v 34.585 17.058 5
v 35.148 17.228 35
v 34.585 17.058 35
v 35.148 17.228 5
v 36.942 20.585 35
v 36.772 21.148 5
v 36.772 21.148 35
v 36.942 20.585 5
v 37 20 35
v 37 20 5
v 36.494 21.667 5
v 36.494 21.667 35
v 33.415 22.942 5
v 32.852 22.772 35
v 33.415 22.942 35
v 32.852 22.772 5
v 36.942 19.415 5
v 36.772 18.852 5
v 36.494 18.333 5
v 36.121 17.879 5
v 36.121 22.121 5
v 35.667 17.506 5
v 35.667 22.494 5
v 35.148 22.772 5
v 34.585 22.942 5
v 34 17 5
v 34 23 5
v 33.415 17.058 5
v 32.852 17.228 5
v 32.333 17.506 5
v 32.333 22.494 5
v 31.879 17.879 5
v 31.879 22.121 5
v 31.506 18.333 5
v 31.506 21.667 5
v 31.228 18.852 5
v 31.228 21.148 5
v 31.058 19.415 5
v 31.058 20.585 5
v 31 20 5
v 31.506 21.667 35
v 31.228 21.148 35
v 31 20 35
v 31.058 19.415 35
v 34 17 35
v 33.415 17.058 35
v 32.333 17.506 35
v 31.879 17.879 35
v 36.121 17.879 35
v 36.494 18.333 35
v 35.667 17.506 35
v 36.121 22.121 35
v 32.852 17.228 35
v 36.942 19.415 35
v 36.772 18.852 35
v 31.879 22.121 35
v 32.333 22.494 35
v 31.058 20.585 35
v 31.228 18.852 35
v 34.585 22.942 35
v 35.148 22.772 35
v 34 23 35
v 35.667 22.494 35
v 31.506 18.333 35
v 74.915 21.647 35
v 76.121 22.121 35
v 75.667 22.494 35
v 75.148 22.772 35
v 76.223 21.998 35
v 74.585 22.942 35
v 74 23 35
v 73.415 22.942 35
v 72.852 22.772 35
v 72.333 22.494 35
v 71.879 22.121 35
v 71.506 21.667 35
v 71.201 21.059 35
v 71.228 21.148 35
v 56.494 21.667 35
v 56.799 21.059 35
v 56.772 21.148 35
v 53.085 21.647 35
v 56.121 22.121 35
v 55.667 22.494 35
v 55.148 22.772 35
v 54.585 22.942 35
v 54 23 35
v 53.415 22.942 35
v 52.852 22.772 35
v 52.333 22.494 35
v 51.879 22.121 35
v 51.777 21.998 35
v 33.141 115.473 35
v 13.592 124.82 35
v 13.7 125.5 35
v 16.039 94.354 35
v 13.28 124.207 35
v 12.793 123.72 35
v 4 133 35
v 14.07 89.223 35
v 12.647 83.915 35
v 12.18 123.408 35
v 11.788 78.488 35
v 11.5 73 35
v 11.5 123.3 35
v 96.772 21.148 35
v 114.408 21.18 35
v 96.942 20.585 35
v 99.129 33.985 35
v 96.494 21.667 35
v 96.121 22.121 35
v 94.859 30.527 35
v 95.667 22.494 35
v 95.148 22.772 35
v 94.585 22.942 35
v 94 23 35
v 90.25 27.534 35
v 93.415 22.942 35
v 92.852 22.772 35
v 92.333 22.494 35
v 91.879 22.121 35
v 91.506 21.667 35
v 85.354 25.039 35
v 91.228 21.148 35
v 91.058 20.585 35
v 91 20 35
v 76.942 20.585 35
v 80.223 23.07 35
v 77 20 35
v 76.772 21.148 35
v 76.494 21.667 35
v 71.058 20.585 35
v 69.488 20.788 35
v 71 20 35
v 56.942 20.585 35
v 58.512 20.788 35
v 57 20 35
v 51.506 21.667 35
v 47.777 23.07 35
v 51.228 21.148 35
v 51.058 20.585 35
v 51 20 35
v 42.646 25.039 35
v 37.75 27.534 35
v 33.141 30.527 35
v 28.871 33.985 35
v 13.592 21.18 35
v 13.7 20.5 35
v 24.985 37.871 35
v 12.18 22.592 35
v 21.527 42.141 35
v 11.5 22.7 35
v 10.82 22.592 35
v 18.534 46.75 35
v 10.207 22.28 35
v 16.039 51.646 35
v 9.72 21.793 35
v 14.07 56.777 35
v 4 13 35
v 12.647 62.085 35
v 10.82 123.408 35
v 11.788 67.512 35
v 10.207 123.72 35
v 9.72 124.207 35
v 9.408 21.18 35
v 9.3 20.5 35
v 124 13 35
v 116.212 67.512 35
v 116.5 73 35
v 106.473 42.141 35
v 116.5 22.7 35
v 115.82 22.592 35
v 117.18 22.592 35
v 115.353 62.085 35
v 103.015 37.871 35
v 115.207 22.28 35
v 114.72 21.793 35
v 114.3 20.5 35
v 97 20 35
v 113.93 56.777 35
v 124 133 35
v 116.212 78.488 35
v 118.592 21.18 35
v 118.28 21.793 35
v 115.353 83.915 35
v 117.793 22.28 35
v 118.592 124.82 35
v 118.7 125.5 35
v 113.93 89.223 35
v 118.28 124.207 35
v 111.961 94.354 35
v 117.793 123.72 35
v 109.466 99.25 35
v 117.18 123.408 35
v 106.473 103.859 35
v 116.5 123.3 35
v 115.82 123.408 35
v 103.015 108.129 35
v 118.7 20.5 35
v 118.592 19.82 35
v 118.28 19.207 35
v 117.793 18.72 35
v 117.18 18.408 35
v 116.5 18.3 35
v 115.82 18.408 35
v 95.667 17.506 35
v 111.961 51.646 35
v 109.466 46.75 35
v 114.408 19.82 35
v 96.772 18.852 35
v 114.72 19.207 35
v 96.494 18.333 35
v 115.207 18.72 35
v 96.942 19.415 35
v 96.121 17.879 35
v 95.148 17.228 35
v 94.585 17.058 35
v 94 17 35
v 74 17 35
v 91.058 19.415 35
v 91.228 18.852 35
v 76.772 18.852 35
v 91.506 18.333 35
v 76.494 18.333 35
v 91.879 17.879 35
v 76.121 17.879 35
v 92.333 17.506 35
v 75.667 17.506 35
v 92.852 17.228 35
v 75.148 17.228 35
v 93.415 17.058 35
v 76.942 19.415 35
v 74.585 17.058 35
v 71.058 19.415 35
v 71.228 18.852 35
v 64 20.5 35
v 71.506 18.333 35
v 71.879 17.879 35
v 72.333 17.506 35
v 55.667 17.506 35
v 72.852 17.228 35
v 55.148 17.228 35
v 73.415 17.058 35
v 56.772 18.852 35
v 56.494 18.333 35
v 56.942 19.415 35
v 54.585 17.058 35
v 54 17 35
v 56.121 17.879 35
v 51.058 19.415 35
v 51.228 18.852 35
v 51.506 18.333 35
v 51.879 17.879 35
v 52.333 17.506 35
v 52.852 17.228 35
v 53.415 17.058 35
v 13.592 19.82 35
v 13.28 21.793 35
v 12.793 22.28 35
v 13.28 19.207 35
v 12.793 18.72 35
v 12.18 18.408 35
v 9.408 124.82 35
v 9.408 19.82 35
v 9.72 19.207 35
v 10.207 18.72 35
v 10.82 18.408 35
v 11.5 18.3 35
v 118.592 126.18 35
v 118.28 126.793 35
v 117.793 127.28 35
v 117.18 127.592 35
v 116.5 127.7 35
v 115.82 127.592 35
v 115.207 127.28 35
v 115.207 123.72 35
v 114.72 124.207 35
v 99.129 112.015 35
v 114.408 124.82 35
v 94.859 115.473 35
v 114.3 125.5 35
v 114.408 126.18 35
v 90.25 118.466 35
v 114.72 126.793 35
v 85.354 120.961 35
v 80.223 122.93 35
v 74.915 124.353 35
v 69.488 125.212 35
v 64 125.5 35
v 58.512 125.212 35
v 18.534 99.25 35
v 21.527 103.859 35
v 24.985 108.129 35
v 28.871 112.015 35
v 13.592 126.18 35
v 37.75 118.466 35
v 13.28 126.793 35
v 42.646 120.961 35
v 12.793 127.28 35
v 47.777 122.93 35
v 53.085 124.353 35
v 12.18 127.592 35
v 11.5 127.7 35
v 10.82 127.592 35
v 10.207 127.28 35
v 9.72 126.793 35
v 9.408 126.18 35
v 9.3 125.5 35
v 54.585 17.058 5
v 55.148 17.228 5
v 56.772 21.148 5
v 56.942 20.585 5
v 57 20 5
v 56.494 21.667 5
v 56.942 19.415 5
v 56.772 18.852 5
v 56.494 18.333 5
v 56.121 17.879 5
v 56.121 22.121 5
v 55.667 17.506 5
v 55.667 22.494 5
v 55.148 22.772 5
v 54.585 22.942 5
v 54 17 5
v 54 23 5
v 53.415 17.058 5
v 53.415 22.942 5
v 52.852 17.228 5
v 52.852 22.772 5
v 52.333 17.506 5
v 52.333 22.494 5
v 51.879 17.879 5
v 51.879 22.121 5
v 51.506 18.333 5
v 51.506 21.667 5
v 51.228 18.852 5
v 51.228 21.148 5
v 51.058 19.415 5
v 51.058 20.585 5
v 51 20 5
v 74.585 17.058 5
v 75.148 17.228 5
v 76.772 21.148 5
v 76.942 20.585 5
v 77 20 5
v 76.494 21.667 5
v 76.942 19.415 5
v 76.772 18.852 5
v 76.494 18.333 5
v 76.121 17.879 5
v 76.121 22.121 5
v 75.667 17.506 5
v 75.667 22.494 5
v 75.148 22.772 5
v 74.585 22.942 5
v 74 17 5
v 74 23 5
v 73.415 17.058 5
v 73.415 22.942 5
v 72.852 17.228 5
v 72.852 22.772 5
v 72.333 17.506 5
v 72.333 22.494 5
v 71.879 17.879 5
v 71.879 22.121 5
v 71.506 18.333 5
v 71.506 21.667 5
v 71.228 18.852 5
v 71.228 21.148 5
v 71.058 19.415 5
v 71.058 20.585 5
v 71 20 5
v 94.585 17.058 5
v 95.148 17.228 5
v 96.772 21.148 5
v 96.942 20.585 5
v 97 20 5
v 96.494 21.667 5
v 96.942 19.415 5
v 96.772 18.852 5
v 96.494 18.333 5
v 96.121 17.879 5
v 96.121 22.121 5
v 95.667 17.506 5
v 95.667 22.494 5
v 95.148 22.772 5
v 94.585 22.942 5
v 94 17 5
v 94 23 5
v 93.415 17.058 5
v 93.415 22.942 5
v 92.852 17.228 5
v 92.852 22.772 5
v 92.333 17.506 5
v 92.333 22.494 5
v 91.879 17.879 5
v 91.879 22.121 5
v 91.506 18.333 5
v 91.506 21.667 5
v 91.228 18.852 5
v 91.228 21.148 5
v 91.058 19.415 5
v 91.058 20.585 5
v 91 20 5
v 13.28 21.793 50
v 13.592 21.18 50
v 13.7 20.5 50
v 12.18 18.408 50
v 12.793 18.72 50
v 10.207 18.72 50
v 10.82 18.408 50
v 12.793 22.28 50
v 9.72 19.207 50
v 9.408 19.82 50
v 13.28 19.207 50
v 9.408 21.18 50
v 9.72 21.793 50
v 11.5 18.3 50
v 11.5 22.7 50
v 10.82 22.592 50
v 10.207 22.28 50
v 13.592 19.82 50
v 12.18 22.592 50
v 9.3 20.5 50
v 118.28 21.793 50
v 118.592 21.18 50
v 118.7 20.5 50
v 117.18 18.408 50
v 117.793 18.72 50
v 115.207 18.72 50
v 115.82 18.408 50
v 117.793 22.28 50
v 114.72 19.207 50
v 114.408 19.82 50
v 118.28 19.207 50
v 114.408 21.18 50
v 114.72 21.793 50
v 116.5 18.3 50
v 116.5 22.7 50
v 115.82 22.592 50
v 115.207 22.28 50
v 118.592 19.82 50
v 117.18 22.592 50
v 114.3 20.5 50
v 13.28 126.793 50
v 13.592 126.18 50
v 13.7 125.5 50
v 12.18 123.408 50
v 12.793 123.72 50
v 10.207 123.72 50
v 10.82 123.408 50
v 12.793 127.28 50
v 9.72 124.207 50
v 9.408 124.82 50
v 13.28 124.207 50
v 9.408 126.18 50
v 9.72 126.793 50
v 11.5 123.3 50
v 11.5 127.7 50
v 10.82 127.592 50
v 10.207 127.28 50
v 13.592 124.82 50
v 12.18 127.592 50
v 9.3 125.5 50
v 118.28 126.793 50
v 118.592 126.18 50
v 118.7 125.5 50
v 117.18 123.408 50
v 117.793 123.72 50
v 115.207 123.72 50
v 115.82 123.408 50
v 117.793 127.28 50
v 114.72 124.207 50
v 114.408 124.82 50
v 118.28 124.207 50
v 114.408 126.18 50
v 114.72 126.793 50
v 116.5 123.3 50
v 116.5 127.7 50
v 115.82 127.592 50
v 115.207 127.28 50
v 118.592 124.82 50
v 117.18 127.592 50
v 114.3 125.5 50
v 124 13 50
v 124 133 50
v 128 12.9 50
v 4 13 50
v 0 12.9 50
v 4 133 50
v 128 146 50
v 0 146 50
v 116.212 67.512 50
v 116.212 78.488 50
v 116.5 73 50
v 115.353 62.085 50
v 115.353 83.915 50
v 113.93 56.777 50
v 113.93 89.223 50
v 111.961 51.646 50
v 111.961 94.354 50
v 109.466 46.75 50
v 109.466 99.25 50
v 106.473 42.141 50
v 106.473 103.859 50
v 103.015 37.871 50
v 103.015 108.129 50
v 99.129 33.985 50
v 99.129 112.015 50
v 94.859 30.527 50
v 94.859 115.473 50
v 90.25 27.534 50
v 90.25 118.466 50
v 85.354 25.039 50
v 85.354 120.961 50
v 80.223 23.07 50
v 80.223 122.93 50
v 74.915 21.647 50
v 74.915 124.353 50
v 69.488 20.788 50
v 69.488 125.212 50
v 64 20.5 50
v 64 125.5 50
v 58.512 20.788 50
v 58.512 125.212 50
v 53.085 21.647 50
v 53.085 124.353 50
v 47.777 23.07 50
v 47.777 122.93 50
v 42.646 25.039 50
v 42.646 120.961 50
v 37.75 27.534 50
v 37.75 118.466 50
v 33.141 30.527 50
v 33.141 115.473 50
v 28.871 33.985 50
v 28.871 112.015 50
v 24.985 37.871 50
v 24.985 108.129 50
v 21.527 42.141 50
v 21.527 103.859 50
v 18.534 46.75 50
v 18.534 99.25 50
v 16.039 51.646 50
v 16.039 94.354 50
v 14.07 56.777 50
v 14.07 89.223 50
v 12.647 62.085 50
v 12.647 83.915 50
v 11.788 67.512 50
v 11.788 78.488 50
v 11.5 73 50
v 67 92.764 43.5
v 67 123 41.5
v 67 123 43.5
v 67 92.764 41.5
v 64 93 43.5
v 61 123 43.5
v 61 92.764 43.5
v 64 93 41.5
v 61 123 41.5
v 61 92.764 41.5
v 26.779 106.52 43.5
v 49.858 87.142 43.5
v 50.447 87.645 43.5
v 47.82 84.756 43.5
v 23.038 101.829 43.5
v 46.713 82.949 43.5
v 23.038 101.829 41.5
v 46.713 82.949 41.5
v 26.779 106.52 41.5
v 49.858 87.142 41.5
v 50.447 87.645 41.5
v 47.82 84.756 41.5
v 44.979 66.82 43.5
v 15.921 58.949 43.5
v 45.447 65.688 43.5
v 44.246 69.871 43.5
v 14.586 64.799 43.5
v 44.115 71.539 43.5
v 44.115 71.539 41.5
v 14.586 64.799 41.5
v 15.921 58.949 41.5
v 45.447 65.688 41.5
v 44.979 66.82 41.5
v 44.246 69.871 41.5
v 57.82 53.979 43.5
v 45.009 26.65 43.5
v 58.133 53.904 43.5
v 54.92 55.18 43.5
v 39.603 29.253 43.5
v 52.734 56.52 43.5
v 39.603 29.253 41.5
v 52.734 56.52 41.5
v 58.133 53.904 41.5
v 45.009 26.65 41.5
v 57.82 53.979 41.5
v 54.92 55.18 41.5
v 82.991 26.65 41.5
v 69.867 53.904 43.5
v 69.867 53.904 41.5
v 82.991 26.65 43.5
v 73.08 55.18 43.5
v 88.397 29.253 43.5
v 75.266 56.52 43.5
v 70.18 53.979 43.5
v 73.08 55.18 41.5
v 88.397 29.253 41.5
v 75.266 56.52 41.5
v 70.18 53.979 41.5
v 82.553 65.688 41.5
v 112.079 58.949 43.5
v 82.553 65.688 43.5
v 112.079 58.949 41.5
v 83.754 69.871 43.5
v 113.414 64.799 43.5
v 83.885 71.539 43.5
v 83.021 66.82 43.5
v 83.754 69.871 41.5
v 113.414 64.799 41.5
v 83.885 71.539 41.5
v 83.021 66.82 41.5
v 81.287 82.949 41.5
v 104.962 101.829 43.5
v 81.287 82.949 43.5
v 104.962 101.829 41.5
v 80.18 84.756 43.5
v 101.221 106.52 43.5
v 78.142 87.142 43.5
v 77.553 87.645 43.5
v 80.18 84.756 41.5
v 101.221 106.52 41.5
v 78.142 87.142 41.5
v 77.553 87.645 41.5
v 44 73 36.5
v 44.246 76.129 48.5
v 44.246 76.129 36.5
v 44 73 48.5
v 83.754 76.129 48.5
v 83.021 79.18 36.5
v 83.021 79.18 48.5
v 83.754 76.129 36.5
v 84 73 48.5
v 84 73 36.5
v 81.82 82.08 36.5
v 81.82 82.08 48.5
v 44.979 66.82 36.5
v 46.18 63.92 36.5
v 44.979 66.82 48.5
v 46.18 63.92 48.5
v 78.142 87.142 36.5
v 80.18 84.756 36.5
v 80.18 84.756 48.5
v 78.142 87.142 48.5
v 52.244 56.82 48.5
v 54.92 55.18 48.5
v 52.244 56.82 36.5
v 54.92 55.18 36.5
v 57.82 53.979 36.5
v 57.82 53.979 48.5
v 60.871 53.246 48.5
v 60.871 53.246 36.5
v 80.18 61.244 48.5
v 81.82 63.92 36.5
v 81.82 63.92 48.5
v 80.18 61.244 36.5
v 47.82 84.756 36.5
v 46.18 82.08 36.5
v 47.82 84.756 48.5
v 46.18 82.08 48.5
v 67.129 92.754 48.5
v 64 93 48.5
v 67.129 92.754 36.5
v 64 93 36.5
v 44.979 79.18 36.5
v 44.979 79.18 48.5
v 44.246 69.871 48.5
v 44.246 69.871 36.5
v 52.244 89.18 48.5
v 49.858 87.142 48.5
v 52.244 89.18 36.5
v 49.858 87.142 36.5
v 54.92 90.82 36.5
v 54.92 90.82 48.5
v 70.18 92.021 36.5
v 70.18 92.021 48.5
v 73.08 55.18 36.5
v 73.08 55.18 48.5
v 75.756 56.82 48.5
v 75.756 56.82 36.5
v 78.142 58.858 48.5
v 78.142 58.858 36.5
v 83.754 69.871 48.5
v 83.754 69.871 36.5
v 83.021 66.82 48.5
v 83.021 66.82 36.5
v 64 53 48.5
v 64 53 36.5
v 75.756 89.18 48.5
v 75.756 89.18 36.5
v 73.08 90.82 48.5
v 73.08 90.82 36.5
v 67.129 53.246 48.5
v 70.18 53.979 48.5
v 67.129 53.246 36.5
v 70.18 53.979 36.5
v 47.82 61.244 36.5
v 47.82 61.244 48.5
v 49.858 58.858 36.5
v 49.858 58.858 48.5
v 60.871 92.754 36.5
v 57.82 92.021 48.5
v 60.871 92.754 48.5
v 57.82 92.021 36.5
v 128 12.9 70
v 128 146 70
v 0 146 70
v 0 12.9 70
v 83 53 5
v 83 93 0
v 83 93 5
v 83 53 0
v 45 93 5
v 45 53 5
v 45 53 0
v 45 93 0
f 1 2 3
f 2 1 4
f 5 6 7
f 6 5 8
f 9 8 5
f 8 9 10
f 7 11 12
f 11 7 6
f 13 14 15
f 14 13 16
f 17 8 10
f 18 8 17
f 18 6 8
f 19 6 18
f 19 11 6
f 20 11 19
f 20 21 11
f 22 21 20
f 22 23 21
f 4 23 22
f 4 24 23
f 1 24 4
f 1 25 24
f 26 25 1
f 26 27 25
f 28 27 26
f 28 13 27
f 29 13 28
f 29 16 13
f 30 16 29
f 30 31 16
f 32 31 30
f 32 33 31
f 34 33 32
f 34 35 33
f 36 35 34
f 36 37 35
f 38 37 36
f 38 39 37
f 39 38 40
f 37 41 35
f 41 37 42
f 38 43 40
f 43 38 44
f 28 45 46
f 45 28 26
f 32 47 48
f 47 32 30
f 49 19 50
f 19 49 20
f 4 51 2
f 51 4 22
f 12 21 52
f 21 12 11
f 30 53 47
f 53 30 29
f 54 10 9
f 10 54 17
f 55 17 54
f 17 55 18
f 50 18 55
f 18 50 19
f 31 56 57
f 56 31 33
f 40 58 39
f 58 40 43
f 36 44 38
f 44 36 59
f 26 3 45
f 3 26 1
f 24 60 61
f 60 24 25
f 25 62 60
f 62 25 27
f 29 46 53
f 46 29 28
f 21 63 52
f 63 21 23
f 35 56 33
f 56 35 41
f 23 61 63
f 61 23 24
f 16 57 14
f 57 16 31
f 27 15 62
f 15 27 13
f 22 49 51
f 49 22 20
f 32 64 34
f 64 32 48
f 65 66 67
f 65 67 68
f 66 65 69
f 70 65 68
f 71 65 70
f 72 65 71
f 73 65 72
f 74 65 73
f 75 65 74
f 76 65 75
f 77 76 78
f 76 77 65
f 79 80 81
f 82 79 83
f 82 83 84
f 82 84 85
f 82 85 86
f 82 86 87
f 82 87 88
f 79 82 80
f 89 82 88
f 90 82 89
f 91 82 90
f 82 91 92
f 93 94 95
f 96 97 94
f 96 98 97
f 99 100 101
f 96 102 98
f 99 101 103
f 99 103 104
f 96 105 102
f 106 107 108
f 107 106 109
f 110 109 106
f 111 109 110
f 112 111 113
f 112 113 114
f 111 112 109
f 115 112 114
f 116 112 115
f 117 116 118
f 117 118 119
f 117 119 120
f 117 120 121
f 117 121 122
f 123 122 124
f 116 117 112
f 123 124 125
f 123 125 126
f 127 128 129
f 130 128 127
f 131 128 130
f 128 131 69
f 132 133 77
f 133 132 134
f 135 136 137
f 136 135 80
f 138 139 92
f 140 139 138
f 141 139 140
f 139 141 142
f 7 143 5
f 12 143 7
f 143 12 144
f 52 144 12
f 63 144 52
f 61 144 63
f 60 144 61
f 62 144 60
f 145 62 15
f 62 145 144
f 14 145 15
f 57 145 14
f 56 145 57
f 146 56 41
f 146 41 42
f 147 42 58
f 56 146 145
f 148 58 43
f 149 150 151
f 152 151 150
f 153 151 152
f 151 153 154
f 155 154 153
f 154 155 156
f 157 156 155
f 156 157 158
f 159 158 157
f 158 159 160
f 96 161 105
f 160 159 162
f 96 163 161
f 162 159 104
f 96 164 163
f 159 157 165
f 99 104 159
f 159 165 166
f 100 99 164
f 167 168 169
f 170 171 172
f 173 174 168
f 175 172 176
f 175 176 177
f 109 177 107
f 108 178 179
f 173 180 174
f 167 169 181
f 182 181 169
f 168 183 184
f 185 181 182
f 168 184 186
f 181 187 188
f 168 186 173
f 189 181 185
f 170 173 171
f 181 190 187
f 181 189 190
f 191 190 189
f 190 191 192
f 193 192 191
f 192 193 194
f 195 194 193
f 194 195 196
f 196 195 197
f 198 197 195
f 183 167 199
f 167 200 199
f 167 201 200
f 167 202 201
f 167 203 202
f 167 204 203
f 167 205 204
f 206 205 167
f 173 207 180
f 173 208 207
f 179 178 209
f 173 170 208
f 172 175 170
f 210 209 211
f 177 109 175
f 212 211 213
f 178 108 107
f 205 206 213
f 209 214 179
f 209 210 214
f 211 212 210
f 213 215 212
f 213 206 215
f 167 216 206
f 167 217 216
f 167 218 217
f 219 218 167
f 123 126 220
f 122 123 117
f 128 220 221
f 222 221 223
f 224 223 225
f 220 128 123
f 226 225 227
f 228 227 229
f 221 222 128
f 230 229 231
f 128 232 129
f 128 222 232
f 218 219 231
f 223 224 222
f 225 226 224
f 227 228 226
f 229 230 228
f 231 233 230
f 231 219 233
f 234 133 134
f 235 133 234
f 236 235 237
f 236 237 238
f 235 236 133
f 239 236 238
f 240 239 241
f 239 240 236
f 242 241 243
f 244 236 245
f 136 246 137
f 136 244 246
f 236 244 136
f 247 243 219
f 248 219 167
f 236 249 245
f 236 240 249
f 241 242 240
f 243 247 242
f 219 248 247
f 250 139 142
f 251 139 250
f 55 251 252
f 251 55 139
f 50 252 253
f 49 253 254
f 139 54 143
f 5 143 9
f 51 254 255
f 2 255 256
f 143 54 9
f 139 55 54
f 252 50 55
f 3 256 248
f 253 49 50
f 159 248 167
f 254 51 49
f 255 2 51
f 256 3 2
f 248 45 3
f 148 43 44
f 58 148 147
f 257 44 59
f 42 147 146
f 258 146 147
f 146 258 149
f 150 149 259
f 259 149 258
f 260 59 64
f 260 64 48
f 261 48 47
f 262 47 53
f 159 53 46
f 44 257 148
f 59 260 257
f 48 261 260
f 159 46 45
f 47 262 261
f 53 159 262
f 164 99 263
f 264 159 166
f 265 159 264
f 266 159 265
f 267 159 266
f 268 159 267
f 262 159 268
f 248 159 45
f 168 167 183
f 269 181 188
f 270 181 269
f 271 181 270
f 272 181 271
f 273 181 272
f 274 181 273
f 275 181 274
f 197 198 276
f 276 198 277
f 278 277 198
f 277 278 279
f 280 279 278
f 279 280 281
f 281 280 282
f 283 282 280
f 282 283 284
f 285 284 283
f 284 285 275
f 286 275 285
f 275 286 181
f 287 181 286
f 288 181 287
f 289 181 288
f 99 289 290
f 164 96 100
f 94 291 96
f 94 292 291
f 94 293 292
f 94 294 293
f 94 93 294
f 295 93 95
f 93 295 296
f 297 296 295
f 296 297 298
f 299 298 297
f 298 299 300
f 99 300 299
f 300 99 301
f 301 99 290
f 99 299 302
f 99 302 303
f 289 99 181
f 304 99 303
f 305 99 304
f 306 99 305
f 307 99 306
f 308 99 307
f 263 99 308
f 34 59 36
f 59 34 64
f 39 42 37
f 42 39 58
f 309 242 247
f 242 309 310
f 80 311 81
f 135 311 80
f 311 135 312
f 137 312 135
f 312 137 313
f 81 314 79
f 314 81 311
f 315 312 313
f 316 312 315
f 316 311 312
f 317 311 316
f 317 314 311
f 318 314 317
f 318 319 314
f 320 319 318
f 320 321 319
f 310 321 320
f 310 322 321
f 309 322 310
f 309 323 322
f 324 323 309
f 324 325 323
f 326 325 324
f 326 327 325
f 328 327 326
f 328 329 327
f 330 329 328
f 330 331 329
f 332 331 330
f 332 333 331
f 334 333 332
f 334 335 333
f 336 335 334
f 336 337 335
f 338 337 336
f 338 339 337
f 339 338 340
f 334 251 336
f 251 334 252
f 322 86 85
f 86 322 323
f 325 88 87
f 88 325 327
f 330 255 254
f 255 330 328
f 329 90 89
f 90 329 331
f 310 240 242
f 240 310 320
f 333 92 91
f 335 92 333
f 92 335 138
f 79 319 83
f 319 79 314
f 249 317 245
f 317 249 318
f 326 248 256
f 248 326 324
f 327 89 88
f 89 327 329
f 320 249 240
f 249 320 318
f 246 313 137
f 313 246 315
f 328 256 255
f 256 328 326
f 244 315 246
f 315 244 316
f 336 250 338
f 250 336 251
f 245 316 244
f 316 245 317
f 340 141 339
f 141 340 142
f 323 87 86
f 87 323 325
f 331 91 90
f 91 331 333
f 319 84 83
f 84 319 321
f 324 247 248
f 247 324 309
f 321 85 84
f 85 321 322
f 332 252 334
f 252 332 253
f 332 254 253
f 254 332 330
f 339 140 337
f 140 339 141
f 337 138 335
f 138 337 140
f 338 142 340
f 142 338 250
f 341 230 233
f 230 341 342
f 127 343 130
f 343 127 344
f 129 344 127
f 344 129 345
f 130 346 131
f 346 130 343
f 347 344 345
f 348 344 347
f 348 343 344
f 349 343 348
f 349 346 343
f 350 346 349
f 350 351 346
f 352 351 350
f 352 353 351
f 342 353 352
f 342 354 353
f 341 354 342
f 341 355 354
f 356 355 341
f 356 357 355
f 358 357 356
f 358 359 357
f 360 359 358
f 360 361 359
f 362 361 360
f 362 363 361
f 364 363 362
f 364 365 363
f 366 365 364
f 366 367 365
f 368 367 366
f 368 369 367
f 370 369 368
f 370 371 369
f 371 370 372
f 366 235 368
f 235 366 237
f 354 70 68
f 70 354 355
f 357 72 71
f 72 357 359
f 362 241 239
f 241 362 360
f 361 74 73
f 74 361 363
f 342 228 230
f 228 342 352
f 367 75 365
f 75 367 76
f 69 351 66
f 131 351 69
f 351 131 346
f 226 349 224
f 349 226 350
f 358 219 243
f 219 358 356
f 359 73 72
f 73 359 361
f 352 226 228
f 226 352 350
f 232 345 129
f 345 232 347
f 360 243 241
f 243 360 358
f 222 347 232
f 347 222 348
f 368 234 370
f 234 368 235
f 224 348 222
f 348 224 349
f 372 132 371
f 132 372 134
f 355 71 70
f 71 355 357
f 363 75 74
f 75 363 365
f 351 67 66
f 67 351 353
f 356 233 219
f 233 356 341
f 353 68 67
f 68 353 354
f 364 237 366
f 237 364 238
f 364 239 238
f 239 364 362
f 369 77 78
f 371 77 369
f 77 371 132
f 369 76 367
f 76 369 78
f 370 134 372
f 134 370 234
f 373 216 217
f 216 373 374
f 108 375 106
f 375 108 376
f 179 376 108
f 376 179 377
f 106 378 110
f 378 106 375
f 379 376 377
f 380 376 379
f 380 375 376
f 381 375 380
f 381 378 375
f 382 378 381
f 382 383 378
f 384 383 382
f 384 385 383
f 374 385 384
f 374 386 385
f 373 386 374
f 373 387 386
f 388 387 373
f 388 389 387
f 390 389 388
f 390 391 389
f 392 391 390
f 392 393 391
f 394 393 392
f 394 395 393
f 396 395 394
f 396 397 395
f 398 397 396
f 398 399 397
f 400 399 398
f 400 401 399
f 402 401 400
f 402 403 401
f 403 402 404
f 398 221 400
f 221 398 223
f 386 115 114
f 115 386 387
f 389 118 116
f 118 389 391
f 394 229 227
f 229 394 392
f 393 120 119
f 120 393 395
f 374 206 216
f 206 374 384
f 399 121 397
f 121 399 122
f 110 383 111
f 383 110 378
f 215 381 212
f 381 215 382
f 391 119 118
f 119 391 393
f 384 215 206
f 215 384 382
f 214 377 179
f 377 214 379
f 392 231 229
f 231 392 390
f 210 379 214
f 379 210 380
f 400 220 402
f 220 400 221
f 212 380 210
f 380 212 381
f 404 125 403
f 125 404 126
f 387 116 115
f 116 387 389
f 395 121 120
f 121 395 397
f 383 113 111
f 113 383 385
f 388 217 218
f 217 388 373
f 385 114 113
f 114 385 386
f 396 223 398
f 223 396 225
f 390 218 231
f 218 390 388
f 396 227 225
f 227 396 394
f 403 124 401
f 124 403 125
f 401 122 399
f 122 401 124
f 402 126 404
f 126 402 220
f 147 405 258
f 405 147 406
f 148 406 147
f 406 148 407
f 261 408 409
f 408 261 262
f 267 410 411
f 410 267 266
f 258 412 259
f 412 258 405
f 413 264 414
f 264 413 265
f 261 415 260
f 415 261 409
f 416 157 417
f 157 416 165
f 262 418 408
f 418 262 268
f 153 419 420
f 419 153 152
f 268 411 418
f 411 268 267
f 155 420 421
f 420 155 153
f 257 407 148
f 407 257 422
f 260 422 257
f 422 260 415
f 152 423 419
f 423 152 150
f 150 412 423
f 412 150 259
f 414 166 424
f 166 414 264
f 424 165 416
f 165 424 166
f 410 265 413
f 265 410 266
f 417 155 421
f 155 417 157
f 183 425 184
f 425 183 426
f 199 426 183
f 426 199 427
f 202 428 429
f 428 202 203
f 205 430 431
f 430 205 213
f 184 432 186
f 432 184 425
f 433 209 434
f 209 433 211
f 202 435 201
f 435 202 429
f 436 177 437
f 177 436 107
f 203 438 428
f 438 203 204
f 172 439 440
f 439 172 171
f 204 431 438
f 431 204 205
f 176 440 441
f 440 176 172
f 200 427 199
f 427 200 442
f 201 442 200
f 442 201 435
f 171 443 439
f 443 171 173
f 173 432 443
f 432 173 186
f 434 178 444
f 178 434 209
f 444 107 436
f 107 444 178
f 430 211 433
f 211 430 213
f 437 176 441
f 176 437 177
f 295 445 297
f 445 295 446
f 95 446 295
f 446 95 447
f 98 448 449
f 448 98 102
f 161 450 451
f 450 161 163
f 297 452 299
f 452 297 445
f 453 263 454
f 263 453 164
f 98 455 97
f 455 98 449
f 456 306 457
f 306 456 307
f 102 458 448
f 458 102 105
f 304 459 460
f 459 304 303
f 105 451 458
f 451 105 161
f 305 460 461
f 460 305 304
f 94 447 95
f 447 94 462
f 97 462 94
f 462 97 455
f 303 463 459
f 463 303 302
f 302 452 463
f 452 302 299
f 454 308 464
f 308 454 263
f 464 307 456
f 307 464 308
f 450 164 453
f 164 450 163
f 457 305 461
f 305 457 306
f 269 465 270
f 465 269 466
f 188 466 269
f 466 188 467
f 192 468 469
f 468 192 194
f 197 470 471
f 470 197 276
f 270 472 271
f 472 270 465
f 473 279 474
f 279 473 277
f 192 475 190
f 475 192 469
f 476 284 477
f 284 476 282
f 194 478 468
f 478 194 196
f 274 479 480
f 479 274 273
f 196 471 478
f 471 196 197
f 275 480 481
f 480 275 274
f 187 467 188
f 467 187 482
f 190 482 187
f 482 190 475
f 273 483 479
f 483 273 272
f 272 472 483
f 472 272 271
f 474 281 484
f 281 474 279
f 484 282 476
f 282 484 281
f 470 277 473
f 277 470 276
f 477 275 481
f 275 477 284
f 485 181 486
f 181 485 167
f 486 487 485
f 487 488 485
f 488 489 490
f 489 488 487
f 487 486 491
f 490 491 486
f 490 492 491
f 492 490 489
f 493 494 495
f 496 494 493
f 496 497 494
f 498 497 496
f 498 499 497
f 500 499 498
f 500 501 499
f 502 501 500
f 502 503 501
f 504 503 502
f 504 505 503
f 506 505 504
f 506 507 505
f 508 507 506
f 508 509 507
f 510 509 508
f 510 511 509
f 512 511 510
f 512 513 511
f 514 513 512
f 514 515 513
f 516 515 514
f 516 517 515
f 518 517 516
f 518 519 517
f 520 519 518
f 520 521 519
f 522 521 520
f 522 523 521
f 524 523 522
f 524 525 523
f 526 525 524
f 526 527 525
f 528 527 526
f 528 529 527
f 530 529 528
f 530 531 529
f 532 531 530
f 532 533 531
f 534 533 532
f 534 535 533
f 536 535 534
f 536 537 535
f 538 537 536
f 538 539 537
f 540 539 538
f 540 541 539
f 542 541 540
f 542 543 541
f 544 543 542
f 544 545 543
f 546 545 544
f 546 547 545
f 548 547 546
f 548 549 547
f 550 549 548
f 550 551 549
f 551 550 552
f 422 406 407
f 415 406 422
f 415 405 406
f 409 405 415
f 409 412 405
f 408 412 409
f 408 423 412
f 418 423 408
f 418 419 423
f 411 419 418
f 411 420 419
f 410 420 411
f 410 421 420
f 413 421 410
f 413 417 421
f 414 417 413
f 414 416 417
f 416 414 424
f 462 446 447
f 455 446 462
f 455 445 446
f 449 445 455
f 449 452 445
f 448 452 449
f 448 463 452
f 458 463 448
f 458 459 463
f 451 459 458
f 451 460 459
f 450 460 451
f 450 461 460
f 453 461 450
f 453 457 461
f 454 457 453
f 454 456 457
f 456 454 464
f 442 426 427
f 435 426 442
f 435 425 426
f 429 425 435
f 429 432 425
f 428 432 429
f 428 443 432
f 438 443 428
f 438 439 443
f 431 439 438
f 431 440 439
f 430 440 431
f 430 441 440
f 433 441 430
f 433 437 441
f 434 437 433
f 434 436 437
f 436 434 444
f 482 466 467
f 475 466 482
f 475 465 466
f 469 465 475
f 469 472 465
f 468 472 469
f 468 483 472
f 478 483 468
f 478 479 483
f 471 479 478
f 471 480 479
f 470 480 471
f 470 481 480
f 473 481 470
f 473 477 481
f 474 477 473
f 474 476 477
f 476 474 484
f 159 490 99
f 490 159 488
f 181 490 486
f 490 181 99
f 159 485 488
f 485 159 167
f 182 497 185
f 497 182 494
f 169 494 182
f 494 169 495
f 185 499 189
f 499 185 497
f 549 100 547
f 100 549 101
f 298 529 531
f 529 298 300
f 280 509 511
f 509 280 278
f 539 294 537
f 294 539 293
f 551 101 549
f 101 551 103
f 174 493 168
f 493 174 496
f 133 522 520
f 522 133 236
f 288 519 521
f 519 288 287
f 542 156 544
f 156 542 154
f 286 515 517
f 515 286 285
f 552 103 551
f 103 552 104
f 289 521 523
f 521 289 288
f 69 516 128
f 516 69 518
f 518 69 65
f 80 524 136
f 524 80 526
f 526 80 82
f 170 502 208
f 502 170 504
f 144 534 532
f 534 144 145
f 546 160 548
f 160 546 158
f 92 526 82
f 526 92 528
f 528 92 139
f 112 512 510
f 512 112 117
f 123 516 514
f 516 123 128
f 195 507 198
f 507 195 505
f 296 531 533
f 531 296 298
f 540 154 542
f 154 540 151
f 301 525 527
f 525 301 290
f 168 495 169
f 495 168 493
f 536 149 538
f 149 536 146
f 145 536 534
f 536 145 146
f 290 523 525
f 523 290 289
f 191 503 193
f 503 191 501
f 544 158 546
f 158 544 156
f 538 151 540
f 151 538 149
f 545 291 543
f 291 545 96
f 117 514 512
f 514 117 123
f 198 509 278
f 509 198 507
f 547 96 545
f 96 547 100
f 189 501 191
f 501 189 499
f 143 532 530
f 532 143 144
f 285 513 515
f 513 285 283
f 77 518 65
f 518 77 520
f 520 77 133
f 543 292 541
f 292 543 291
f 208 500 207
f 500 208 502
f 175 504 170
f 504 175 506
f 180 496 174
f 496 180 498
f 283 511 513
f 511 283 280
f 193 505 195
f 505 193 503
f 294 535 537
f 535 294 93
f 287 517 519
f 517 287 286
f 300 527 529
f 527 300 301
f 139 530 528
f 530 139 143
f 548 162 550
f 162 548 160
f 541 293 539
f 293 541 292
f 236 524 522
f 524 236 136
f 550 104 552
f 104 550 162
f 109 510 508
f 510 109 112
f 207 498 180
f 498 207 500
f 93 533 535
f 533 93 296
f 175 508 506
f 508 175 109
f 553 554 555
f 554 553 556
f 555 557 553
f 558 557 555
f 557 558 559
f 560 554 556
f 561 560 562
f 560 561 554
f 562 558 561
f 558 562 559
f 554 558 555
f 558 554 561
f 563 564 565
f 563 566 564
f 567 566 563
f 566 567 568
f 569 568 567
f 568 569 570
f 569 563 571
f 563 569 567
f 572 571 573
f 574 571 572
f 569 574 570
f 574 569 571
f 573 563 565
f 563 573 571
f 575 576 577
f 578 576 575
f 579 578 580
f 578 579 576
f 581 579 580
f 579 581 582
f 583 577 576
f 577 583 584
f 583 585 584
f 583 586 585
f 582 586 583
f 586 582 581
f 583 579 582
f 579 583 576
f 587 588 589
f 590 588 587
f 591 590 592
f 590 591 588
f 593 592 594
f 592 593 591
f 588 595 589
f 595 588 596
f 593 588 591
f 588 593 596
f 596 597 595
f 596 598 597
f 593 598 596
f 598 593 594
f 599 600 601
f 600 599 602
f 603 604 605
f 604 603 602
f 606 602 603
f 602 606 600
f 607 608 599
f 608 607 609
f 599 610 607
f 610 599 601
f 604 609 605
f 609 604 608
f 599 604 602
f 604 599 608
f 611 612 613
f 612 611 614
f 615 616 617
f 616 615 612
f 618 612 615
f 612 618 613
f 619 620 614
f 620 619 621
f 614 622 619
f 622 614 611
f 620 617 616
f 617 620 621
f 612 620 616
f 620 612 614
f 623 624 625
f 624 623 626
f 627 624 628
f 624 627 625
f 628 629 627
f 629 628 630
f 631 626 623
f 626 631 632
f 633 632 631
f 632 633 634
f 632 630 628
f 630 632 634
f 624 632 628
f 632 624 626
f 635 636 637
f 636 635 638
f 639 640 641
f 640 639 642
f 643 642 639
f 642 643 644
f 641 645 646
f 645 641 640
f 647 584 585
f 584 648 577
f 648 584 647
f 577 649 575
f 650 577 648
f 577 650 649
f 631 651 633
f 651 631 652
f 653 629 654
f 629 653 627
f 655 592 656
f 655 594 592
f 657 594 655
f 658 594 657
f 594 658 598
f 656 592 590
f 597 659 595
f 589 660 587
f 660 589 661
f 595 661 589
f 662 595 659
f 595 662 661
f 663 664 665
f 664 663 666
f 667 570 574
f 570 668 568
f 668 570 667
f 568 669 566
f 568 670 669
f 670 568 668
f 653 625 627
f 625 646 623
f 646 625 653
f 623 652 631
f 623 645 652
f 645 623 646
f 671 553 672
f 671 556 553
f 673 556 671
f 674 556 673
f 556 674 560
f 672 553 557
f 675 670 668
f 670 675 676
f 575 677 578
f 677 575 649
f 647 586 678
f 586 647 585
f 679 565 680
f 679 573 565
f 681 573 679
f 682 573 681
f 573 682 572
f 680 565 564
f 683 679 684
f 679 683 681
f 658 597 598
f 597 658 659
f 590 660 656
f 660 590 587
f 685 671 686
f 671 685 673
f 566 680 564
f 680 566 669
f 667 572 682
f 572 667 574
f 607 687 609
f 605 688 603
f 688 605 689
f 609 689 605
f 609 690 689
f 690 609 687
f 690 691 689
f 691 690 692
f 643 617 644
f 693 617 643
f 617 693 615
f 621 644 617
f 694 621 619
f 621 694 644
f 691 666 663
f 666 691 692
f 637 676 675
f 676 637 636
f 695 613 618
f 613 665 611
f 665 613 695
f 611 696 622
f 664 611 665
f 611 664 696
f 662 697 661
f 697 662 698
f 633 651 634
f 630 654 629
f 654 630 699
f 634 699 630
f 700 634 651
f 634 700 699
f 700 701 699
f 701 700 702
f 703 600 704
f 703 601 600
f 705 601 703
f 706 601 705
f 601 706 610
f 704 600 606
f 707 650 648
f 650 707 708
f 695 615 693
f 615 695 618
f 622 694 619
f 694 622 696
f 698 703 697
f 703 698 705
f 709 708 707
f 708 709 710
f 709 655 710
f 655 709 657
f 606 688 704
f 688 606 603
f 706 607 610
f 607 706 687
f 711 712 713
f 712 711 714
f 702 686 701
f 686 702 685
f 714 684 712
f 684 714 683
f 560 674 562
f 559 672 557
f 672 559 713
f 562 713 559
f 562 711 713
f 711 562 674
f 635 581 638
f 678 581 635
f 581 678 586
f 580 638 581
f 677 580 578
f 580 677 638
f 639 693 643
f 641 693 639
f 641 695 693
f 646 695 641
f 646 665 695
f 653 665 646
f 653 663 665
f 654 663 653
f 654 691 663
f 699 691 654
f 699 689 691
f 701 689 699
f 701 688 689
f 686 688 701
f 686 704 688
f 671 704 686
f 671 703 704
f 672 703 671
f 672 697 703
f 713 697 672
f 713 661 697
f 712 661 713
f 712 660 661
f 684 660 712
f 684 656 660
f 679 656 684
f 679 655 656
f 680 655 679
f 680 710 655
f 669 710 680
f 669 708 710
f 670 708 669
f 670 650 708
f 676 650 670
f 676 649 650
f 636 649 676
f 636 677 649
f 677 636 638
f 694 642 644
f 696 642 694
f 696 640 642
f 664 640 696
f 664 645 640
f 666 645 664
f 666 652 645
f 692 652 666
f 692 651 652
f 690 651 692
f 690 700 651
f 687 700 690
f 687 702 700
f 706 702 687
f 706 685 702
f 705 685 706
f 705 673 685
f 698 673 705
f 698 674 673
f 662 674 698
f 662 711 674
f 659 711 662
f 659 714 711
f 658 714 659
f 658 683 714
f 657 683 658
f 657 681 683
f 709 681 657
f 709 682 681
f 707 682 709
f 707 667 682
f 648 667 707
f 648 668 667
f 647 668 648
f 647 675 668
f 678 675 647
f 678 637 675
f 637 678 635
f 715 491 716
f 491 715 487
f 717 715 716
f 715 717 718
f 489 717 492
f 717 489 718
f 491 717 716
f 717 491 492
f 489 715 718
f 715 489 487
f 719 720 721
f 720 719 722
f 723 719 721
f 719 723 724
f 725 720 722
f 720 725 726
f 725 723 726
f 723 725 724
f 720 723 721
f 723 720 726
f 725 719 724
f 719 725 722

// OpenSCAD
// file: ../cooling/fan_120mm_15mm.scad
// 120mm Slim Case Fan Model
// 120x120x15mm fan (NF-A12x15 style)

module fan_120mm_15mm() {
    fan_size = 120;
    fan_thickness = 15;
    hub_diameter = 40;
    mount_hole_inset = 7.5;  // Distance from edge to mount hole center
    mount_hole_radius = 2.2; // ~M4 clearance

    union() {
        color("tan") {
            difference() {
                // Outer frame
                cube([fan_size, fan_size, fan_thickness]);

                // Center opening for airflow
                translate([fan_size/2, fan_size/2, -0.1]) {
                    cylinder(h = fan_thickness + 0.2, r = (fan_size - 15) / 2, $fn = 60);
                }

                // Corner mount holes (standard 105mm spacing)
                mount_positions = [
                    [mount_hole_inset, mount_hole_inset],
                    [fan_size - mount_hole_inset, mount_hole_inset],
                    [mount_hole_inset, fan_size - mount_hole_inset],
                    [fan_size - mount_hole_inset, fan_size - mount_hole_inset]
                ];
                for (pos = mount_positions) {
                    translate([pos[0], pos[1], -0.1]) {
                        cylinder(h = fan_thickness + 0.2, r = mount_hole_radius, $fn = 20);
                    }
                }
            }
        }

        // Hub
        color("black") {
            translate([fan_size/2, fan_size/2, fan_thickness/2]) {
                cylinder(h = fan_thickness - 3, r = hub_diameter/2, center = true, $fn = 40);
            }
        }

        // Blades (simplified)
        color("gray") {
            translate([fan_size/2, fan_size/2, fan_thickness/2]) {
                for (i = [0:6]) {
                    rotate([0, 0, i * 360/7]) {
                        translate([0, 30, 0]) {
                            cube([6, 40, 2], center = true);
                        }
                    }
                }
            }
        }
    }
}

// Preview
fan_120mm_15mm();
// file: heatsink_fins.scad
// Noctua NH-L12S Heatsink Fins
// Aluminum fin stack at top of cooler

module nh_l12s_fins() {
    fins_w = 128;
    fins_d = 146;
    fins_h = 20;

    // RAM cutout dimensions
    ram_cutout_w = 134;
    ram_cutout_d = 13;
    ram_cutout_h = fins_h + 1;

    color("silver") {
        difference() {
            cube([fins_w, fins_d, fins_h]);
            // RAM Cutout (front edge, full height of fins)
            translate([(fins_w - ram_cutout_w)/2, -0.1, -0.1]) {
                cube([ram_cutout_w, ram_cutout_d, ram_cutout_h]);
            }
        }
    }
}

// Preview
nh_l12s_fins();
// file: heatpipes.scad
// Noctua NH-L12S Heatpipes
// 4x 6mm diameter copper heatpipes on one side of the heatsink

module nh_l12s_heatpipes() {
    pipe_diameter = 6;
    pipe_radius = pipe_diameter / 2;
    pipe_count = 4;
    pipe_height = 30;

    // Heatsink dimensions for reference
    heatsink_w = 128;
    heatsink_d = 146;

    // Pipes are positioned on front side (low Y), spread across width
    // Centered within the heatsink width
    pipe_spacing = 20;  // Space between pipe centers
    total_pipe_span = (pipe_count - 1) * pipe_spacing;
    start_x = (heatsink_w - total_pipe_span) / 2;

    // Y position - near front edge
    pipe_y = 20;  // Distance from front edge

    color([0.72, 0.45, 0.2]) {  // Copper color
        for (i = [0 : pipe_count - 1]) {
            translate([start_x + i * pipe_spacing, pipe_y, 0]) {
                cylinder(h = pipe_height, r = pipe_radius, $fn = 32);
            }
        }
    }
}

// Preview
nh_l12s_heatpipes();
// file: cpu_base.scad
// Noctua NH-L12S CPU Contact Base
// Copper contact plate that sits on the CPU

module nh_l12s_cpu_base() {
    base_w = 38;
    base_d = 40;
    base_h = 5;

    // Copper colored contact plate
    color([0.72, 0.45, 0.2]) {
        cube([base_w, base_d, base_h]);
    }
}

// Preview
nh_l12s_cpu_base();
// main file
// Noctua NH-L12S Complete Heatsink Assembly
// Combines: CPU base + heatpipes + fan + fins
// Total height: 70mm

use <cpu_base.scad>
use <heatpipes.scad>
use <heatsink_fins.scad>
use <../cooling/fan_120mm_15mm.scad>

module noctua_nh_l12s() {
    // Overall dimensions
    cooler_w = 128;
    cooler_d = 146;

    // Component heights (bottom to top)
    cpu_base_h = 5;
    heatpipes_h = 30;
    fan_h = 15;
    fins_h = 20;
    // Total: 5 + 30 + 15 + 20 = 70mm

    // CPU base dimensions for centering
    cpu_base_w = 38;
    cpu_base_d = 40;
    cpu_base_x = (cooler_w - cpu_base_w) / 2;
    cpu_base_y = (cooler_d - cpu_base_d) / 2;

    // Fan dimensions for centering
    fan_size = 120;
    fan_x = (cooler_w - fan_size) / 2;
    fan_y = (cooler_d - fan_size) / 2;

    union() {
        // CPU base (at bottom, centered)
        translate([cpu_base_x, cpu_base_y, 0]) {
            nh_l12s_cpu_base();
        }

        // Heatpipes (above CPU base)
        translate([0, 0, cpu_base_h]) {
            nh_l12s_heatpipes();
        }

        // Fan (on inside face of fins, centered)
        translate([fan_x, fan_y, cpu_base_h + heatpipes_h]) {
            fan_120mm_15mm();
        }

        // Fins (at top)
        translate([0, 0, cpu_base_h + heatpipes_h + fan_h]) {
            nh_l12s_fins();
        }
    }
}

// Preview
noctua_nh_l12s();
